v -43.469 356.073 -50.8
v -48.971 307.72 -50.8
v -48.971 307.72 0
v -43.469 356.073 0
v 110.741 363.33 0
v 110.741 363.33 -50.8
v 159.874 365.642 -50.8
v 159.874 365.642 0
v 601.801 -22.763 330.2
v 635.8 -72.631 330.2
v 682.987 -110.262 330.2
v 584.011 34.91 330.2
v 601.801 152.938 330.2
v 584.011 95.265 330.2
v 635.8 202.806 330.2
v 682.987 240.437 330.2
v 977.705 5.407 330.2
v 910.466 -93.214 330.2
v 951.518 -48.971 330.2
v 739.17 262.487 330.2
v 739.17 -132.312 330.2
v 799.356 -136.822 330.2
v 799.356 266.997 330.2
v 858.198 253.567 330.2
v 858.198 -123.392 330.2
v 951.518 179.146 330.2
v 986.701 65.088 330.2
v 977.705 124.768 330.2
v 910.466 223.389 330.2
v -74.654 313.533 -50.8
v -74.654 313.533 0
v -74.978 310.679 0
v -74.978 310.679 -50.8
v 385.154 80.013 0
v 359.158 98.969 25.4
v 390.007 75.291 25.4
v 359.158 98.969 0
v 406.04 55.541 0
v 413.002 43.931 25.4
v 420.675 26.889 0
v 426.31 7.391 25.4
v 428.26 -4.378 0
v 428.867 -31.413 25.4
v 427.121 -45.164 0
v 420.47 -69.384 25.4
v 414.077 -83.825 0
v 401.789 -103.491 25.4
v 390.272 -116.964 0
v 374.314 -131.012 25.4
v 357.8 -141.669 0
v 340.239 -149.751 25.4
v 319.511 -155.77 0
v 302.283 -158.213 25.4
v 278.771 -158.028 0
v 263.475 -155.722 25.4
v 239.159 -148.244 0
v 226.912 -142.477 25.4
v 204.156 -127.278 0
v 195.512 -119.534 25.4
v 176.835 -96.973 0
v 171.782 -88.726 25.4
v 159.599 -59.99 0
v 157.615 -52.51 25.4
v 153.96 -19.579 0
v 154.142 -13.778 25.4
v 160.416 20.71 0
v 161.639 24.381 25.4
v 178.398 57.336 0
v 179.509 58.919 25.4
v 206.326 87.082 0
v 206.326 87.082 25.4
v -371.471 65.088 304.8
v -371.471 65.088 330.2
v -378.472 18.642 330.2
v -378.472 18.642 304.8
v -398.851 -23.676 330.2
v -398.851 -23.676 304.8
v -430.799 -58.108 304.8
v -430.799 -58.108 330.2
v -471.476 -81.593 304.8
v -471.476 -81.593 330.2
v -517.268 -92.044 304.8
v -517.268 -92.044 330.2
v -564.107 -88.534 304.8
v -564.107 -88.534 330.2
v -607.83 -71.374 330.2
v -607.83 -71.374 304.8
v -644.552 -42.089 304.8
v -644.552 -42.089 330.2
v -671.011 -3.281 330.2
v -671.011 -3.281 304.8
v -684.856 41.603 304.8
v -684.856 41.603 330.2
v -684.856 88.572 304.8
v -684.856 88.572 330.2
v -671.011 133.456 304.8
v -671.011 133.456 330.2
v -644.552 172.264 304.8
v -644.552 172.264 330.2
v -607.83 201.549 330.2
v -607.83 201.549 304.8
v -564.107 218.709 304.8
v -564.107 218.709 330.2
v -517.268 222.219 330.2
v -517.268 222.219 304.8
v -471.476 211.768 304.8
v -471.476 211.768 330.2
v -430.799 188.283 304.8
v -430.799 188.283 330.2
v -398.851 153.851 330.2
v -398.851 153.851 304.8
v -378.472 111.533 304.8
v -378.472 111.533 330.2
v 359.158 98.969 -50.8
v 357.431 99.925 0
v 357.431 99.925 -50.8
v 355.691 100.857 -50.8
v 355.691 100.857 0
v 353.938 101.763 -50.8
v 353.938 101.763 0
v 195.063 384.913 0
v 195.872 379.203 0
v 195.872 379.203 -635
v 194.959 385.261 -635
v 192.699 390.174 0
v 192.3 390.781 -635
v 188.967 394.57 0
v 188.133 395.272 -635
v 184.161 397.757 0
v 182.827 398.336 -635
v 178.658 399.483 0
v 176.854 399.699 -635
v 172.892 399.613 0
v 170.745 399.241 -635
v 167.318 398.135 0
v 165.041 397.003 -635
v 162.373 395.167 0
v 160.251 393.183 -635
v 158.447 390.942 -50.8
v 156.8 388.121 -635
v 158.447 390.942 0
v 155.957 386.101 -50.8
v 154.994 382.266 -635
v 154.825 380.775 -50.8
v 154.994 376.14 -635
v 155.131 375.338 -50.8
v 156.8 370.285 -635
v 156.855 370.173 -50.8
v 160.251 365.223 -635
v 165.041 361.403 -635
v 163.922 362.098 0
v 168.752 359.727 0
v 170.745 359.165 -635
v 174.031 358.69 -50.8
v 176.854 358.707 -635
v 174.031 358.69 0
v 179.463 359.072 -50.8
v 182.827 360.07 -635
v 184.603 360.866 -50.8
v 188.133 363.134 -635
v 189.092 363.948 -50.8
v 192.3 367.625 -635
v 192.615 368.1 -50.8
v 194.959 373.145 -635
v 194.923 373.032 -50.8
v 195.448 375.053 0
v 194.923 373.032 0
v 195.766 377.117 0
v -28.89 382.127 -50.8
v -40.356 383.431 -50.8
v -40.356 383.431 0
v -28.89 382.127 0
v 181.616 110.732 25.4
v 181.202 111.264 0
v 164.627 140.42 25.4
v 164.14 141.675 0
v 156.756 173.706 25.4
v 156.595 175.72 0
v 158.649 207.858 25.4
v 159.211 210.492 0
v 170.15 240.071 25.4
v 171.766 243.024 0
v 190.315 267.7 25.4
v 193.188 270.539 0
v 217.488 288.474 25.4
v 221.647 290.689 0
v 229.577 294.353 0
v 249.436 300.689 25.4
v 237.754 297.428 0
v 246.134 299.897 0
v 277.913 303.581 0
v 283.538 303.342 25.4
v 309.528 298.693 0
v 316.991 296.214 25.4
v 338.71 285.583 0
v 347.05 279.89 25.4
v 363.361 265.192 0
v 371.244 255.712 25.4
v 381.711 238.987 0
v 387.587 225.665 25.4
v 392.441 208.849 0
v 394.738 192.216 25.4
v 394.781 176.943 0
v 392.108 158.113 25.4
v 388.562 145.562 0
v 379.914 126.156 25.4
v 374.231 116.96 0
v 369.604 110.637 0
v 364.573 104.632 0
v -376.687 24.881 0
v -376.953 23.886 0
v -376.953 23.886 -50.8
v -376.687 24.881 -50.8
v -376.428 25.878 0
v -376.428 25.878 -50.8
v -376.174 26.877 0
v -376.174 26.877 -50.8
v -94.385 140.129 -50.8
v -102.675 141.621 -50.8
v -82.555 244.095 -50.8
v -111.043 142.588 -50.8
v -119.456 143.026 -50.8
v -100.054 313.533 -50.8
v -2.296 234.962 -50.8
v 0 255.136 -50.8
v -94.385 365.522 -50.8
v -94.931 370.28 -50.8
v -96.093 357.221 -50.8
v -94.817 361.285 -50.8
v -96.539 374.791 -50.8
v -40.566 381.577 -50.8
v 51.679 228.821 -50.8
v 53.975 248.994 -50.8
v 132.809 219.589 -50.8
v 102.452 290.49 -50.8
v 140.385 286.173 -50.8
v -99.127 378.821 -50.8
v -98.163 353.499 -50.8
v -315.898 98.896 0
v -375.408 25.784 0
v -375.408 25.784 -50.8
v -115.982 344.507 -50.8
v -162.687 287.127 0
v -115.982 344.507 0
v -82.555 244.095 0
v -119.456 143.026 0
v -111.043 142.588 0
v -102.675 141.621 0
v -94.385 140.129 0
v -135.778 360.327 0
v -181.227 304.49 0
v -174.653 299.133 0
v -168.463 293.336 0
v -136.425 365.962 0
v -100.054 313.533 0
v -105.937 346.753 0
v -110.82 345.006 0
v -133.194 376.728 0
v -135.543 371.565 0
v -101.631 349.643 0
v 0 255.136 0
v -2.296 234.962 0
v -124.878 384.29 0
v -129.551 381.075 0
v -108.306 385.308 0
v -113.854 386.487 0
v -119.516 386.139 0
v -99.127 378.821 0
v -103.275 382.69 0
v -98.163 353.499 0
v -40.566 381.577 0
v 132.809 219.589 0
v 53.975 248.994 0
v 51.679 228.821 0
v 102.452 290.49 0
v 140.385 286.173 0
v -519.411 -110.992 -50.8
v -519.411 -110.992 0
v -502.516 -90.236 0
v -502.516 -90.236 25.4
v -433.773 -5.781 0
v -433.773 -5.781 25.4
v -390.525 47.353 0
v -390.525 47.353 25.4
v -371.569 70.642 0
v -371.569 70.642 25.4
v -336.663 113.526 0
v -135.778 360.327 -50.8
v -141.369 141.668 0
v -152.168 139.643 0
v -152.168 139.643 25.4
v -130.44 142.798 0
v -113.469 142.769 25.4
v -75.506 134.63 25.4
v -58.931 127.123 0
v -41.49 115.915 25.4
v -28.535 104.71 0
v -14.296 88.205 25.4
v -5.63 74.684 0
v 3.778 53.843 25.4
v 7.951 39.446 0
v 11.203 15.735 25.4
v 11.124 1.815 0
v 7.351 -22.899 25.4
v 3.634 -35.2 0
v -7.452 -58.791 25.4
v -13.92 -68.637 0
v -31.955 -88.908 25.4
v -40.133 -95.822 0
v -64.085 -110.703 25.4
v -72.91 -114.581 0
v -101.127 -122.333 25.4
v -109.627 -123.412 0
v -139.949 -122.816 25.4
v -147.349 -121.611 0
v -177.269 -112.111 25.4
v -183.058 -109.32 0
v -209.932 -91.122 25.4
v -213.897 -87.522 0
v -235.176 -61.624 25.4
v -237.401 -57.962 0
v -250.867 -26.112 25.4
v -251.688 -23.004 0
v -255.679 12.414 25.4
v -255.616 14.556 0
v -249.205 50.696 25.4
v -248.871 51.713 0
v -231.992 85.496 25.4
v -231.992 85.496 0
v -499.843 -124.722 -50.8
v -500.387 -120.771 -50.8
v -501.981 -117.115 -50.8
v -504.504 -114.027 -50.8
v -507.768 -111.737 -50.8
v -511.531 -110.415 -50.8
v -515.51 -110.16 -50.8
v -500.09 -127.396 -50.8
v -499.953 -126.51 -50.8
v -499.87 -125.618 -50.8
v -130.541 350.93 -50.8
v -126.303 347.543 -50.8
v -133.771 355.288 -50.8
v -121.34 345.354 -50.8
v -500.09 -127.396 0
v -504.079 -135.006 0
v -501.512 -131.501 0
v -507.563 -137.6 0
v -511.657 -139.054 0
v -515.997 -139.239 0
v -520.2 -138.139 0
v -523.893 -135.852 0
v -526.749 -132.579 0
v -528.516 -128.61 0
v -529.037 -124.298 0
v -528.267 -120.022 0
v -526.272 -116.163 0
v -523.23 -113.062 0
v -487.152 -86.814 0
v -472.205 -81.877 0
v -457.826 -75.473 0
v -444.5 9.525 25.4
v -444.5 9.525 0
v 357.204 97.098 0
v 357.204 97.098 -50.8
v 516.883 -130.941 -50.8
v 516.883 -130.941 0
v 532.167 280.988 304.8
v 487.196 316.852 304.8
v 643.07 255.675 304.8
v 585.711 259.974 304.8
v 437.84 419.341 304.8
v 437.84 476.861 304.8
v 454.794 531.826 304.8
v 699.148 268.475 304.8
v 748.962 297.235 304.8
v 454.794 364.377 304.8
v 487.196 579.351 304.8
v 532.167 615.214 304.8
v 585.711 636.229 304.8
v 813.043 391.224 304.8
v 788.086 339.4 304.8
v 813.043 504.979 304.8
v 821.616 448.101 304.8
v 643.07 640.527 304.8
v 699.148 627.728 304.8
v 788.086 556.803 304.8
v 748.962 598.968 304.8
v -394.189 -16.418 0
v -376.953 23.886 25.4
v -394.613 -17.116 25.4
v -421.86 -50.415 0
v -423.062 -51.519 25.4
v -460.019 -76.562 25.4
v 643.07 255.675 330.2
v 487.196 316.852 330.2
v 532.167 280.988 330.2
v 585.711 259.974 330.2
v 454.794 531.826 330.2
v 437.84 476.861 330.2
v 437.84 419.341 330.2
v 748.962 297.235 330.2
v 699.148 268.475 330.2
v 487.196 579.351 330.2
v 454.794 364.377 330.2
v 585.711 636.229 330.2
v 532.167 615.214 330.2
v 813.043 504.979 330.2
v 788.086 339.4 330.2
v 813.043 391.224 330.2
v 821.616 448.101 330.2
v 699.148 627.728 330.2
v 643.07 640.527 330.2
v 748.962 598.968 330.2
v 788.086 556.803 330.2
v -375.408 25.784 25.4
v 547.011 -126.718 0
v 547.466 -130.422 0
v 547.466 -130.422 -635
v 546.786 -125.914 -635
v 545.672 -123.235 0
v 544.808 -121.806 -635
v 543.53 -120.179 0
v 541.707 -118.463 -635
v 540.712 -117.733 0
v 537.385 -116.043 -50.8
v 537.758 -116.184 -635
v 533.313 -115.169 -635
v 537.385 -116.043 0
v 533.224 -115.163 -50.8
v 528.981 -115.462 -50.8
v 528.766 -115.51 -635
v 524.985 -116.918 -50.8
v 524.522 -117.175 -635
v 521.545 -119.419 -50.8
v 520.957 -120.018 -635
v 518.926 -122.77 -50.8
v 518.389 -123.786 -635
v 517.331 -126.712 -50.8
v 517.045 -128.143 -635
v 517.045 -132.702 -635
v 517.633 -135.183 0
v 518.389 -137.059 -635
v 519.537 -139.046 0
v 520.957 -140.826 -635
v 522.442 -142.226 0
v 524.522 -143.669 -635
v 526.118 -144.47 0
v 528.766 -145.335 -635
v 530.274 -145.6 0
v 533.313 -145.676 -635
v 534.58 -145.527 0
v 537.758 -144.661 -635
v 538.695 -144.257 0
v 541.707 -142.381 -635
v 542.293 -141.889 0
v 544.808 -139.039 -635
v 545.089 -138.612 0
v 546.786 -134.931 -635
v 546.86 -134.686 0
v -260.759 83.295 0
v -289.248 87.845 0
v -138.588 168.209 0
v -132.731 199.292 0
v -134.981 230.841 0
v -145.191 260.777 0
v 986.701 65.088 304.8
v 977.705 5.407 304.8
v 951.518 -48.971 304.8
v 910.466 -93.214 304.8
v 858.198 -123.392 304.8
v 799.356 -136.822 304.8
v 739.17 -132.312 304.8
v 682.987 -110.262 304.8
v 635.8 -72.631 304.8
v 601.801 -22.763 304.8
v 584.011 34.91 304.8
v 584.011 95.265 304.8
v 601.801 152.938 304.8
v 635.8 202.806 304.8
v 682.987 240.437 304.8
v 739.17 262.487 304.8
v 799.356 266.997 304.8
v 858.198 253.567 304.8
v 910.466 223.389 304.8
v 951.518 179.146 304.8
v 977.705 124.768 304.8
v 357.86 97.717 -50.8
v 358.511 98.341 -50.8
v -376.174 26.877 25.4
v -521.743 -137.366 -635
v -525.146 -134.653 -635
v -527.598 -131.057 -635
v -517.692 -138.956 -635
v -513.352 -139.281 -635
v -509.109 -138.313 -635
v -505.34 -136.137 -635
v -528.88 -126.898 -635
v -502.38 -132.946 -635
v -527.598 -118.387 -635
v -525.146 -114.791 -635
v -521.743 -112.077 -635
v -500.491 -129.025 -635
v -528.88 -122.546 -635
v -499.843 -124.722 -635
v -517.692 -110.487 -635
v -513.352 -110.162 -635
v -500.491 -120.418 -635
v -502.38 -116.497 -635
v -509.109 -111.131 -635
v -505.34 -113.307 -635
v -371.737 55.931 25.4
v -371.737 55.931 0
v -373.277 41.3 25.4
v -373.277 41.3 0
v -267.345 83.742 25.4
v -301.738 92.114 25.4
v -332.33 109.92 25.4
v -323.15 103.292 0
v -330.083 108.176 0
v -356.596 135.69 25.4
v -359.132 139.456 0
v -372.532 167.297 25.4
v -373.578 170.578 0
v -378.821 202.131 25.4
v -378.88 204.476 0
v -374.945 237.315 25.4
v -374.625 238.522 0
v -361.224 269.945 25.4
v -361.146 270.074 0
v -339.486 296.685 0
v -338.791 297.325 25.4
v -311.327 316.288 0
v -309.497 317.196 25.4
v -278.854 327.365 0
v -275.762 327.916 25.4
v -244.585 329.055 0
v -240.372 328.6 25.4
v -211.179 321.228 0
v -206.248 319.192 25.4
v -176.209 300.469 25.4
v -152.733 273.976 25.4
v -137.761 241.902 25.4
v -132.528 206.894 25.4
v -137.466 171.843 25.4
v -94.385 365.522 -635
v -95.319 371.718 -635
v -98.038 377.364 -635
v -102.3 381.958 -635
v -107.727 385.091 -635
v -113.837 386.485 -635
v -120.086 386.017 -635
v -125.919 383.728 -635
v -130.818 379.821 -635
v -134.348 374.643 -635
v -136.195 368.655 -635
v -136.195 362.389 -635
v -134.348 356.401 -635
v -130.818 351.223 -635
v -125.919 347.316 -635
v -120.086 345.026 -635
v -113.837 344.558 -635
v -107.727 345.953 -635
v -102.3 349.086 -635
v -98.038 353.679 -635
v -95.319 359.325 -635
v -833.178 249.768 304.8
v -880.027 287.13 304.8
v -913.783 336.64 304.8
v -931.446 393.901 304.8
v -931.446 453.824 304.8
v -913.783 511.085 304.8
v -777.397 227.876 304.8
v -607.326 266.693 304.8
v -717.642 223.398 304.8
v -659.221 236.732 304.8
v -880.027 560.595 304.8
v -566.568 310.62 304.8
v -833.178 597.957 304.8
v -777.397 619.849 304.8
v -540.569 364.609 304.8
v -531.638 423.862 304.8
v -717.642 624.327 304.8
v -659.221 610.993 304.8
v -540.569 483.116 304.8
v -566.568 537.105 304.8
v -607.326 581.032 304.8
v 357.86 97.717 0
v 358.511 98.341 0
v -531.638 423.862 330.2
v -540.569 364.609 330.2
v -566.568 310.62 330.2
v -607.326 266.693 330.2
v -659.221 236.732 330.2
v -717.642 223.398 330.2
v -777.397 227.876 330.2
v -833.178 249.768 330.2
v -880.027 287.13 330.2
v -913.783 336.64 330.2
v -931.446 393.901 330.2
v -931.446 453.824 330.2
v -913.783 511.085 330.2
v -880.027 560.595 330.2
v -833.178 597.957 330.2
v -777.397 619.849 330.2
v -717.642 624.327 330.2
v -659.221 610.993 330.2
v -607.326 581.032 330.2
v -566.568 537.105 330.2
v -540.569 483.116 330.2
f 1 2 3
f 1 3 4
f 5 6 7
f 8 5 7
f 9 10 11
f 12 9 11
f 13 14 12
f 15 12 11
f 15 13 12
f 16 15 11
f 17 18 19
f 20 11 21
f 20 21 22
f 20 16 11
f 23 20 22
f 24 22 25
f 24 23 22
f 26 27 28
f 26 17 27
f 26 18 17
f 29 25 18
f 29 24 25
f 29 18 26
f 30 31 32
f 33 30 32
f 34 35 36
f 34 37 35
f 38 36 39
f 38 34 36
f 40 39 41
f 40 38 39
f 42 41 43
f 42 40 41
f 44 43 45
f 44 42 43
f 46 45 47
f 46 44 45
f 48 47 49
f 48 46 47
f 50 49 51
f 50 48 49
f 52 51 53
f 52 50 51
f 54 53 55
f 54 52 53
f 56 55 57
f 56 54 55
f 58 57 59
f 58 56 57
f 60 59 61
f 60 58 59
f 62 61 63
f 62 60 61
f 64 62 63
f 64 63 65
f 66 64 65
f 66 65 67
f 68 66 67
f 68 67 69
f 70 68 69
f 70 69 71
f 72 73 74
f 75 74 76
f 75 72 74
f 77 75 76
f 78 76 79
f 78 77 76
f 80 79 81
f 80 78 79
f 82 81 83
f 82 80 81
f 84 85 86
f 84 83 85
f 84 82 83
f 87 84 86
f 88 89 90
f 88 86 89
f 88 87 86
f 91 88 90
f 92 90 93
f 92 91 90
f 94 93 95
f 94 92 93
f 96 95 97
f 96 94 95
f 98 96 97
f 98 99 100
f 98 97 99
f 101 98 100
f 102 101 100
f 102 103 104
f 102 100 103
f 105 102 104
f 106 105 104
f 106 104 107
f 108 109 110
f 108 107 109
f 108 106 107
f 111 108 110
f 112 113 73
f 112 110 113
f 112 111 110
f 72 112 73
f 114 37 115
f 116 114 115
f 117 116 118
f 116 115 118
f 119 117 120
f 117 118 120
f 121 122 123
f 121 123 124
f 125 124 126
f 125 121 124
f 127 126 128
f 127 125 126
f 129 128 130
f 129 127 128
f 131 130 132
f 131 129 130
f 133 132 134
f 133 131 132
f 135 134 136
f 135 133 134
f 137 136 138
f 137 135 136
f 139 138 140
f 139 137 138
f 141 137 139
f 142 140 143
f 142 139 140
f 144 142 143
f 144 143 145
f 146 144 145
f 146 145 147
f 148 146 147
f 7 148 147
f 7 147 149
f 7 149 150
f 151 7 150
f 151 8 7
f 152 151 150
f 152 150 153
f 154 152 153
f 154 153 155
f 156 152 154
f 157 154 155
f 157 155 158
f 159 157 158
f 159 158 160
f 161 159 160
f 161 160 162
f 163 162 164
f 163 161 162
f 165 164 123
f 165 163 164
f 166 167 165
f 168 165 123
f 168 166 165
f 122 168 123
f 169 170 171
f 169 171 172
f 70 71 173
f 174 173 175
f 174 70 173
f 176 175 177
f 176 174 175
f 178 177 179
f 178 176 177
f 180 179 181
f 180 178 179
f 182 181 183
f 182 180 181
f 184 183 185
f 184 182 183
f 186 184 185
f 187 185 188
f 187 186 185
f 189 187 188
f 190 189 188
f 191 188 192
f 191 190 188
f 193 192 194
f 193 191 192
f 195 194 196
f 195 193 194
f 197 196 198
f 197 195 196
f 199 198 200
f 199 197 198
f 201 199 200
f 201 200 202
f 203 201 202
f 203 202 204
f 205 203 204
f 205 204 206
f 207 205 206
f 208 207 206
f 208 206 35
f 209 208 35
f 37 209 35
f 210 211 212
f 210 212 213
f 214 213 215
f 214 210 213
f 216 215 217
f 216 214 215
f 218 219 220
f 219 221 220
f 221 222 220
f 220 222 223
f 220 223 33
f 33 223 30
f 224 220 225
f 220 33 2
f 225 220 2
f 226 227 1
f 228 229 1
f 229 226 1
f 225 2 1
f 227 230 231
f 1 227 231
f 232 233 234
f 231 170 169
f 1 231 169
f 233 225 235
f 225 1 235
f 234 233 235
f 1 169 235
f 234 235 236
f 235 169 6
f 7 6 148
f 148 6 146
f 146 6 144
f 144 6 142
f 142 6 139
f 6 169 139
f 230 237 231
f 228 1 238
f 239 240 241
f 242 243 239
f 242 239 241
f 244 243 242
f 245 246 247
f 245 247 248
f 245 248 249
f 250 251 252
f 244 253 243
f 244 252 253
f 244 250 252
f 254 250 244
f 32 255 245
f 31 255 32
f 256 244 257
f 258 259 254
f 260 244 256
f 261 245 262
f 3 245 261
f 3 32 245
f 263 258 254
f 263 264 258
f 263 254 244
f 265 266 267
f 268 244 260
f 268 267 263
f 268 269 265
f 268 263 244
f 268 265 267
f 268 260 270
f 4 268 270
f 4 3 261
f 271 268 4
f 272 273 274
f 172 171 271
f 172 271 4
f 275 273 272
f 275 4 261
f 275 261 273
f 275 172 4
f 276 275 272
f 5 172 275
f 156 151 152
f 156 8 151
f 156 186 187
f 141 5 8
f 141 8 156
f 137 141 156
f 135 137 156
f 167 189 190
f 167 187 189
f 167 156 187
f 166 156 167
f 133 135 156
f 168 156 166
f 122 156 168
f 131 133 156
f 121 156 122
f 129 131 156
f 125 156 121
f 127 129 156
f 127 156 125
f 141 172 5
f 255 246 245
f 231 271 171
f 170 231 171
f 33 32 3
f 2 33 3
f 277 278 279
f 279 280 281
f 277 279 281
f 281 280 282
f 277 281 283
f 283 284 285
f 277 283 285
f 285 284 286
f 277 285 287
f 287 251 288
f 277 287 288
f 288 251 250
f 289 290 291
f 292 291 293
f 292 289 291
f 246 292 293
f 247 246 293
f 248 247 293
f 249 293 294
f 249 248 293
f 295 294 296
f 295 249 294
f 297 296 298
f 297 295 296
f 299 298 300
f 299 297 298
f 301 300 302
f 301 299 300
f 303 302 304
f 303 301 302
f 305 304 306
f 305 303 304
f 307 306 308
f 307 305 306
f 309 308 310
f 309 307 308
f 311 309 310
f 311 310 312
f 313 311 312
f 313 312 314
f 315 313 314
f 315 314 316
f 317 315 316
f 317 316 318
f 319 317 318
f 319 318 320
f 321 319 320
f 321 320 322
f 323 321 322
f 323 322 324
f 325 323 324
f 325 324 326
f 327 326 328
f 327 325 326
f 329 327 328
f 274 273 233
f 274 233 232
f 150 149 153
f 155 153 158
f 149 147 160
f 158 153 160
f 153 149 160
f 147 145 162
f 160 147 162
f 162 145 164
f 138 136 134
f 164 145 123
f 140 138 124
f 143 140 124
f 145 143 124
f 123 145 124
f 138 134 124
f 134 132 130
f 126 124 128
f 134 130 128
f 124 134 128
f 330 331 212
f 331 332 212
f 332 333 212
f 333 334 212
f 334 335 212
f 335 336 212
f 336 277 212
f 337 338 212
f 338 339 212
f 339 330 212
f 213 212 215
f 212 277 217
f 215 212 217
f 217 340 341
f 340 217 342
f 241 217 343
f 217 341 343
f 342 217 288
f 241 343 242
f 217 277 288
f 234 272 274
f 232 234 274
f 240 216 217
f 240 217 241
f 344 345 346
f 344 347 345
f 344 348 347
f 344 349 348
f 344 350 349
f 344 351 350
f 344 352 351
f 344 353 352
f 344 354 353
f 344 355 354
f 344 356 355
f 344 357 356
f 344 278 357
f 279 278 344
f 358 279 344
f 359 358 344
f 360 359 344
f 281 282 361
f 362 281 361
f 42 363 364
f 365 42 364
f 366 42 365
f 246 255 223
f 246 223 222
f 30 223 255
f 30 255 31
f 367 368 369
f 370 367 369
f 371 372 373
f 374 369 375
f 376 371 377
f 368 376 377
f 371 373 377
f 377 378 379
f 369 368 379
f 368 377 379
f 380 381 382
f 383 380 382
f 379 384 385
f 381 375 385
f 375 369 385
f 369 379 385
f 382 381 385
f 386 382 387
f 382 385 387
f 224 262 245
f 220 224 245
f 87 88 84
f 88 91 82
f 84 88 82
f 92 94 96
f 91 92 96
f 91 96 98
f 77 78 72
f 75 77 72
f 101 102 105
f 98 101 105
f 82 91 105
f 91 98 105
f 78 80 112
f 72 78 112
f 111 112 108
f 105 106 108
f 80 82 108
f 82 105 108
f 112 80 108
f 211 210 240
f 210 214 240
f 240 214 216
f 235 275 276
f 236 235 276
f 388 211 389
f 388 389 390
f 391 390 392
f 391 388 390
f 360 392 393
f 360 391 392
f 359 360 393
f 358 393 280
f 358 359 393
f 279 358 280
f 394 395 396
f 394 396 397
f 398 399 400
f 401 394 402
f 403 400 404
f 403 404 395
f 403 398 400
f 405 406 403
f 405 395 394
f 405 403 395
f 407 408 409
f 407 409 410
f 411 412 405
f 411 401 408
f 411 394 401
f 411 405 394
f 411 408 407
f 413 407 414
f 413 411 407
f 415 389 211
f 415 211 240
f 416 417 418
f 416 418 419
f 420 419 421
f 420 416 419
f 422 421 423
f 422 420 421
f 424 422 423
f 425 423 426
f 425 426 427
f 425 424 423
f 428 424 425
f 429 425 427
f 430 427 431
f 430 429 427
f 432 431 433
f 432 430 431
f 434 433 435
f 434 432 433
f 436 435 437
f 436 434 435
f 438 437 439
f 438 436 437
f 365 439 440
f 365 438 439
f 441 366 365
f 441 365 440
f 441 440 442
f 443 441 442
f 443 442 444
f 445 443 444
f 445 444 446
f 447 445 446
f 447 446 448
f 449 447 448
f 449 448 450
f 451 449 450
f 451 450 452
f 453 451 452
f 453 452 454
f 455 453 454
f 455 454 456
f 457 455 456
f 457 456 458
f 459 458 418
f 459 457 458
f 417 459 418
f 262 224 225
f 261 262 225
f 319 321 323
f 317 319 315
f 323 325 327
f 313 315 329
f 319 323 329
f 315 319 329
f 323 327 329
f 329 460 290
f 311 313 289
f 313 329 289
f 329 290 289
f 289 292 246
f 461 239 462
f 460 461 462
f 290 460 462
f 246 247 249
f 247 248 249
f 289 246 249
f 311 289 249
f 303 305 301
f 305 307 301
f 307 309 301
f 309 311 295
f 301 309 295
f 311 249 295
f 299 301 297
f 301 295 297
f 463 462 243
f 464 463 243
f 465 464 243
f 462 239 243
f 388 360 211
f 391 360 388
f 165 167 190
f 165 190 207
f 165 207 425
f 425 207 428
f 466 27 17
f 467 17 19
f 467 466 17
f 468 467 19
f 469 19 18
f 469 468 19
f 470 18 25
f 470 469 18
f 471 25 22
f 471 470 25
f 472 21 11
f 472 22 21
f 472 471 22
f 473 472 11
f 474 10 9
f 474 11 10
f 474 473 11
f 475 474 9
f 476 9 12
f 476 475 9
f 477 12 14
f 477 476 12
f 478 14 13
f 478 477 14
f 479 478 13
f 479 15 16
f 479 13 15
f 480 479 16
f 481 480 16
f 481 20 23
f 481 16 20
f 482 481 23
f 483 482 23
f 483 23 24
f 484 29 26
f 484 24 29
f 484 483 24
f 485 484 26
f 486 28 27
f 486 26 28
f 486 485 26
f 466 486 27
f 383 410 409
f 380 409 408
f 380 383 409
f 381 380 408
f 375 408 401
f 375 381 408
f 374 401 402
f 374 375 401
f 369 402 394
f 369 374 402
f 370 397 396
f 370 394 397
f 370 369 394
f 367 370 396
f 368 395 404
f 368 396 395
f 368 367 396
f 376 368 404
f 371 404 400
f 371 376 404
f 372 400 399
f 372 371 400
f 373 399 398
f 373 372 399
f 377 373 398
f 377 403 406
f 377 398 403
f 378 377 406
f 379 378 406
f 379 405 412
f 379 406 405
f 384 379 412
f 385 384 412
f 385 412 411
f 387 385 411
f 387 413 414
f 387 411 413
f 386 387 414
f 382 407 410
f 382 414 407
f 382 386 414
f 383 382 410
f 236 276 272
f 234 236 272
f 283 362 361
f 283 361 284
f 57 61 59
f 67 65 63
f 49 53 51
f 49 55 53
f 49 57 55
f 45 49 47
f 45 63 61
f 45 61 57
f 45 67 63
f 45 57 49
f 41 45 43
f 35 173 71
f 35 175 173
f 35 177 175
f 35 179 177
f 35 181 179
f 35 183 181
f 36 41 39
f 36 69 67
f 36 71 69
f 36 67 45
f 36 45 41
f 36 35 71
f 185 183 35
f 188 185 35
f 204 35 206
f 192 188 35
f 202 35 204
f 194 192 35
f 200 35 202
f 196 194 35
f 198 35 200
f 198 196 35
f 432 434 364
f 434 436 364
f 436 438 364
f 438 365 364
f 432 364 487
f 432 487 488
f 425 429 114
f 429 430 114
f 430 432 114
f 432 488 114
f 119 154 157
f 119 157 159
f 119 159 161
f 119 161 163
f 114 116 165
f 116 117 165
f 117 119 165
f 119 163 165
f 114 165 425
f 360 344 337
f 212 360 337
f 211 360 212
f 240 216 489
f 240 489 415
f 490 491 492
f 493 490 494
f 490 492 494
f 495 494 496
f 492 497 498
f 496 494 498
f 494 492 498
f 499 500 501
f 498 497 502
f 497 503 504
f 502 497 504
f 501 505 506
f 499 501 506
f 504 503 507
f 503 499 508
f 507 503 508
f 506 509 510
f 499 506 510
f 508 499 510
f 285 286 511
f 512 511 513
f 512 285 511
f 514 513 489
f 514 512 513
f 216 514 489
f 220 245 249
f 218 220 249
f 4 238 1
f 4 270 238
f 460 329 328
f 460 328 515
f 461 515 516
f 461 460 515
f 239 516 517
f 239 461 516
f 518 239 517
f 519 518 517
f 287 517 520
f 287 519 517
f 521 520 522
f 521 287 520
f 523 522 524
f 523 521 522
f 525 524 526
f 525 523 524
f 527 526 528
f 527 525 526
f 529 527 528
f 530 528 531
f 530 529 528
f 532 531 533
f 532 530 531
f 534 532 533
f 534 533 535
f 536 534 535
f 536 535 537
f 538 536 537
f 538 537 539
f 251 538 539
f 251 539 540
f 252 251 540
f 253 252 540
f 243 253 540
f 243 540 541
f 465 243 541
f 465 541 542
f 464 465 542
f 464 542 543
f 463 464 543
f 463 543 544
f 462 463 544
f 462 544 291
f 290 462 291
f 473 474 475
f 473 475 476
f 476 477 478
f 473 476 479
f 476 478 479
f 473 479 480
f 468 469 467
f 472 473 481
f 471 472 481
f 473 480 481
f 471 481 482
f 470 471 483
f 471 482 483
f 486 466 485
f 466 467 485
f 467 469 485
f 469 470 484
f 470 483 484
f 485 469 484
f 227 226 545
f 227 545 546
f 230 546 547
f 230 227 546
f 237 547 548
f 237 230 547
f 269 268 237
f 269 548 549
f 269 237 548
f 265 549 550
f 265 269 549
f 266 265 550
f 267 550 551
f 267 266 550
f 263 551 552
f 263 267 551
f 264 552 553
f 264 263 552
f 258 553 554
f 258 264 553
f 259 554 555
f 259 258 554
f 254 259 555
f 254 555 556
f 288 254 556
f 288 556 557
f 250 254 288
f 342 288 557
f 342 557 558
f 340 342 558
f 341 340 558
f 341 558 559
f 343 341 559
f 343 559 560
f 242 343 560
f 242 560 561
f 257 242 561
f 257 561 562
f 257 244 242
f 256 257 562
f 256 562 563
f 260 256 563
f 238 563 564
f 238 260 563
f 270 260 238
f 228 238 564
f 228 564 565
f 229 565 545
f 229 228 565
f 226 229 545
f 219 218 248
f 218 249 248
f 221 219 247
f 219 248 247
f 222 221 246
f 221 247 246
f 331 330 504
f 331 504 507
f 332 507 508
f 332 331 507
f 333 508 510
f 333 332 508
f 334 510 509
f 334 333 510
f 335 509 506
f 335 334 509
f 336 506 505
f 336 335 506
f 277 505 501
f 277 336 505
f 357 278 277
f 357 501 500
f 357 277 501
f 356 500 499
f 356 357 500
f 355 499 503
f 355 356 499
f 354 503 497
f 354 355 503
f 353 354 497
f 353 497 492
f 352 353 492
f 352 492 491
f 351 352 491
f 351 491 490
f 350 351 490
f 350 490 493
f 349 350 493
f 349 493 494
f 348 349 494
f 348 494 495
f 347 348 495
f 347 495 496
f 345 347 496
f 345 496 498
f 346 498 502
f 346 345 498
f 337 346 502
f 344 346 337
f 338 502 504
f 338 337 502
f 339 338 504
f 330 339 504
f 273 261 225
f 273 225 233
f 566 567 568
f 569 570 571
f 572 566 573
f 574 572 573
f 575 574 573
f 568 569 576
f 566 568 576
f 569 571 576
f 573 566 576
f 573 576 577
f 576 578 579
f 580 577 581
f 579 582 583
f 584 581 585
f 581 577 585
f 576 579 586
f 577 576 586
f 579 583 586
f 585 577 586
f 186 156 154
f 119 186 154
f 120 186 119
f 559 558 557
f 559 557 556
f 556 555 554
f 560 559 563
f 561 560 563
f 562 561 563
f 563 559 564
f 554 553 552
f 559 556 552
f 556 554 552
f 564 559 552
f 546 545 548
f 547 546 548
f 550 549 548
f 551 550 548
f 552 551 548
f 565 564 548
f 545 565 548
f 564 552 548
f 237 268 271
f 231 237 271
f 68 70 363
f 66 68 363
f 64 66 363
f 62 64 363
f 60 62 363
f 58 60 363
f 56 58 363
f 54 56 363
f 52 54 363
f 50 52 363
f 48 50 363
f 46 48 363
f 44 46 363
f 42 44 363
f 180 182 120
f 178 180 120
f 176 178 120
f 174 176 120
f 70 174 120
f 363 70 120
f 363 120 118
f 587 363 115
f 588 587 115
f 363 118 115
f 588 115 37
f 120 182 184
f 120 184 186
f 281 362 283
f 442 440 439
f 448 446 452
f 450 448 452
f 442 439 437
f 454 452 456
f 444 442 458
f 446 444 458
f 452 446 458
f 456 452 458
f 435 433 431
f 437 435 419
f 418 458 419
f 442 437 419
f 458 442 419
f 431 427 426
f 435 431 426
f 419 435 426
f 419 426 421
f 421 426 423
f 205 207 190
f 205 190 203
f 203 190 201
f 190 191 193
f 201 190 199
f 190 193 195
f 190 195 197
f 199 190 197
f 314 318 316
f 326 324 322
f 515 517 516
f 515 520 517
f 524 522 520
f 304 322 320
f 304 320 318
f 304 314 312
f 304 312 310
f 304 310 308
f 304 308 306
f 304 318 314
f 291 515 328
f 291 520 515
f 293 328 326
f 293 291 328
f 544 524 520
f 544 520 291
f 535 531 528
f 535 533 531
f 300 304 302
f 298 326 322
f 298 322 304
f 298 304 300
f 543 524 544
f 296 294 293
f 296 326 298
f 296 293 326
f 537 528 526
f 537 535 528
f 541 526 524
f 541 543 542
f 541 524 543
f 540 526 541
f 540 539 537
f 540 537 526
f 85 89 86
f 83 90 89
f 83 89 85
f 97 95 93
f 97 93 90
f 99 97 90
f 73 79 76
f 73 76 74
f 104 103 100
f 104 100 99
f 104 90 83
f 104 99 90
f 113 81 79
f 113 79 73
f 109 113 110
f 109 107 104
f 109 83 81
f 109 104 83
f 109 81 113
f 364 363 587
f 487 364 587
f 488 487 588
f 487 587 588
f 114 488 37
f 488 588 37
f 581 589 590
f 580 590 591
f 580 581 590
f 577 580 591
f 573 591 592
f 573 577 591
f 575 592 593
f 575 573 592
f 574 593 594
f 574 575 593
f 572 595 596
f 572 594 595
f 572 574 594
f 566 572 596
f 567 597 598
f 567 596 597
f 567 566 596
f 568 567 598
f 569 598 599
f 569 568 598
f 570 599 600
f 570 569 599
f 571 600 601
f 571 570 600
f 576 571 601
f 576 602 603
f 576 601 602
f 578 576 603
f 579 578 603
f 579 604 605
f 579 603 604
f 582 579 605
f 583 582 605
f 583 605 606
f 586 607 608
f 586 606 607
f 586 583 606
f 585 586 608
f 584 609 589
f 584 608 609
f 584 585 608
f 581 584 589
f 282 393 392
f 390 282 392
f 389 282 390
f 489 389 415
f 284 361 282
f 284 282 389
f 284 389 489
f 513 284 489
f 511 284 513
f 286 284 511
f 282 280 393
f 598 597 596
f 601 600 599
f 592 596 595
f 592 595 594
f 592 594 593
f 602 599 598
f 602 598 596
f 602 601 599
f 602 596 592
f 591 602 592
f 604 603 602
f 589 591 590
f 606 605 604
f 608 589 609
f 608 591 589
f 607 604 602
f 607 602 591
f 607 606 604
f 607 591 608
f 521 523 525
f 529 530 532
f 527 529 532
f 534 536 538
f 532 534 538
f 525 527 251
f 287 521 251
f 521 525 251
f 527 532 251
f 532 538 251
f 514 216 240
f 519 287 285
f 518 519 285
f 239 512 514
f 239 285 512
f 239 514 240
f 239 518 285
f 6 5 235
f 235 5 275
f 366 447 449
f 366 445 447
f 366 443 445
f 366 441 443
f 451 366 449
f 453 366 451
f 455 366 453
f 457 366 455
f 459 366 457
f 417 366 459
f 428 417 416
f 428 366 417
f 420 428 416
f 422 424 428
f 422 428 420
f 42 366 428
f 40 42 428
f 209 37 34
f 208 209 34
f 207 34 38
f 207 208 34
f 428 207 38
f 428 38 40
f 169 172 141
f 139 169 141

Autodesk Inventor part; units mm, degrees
ref_plane "YZ Plane" through (0, 0, 0) normal (1, 0, 0) x (0, 1, 0)
ref_plane "XZ Plane" through (0, 0, 0) normal (0, 1, 0) x (-1, 0, 0)
sketch "Sketch1" plane through (0, 0, 0) normal (0, 0, 1) x (1, 0, 0)
  line L0 (-40.3555, 383.4313) -> (111.0673, 366.2011)
  line L1 (111.0673, 366.2011) -> (102.4522, 290.4897)
  line L2 (102.4522, 290.4897) -> (-48.9706, 307.7199)
  line L3 (-48.9706, 307.7199) -> (-40.3555, 383.4313)
  line L4 (-87.7484, 312.1324) -> (140.3854, 286.1733)
  line L5 (140.3854, 286.1733) -> (132.8088, 219.5891)
  line L6 (132.8088, 219.5891) -> (-95.3249, 245.5482)
  line L7 (-95.3249, 245.5482) -> (-87.7484, 312.1324)
  circle A0 centre (175.3182, 379.203) radius 20.5535
  circle A1 centre (-115.4076, 365.5218) radius 21.0224
  circle A2 centre (532.1699, -130.4223) radius 15.2961
  circle A3 centre (-514.4431, -124.7218) radius 14.6004
  line L8 (-128.6785, 349.2176) -> (-505.2263, -113.3983) construction
  line L9 (-94.4085, 366.51) -> (154.7875, 378.2368) construction
  line L10 (187.1074, 362.3667) -> (523.3963, -117.8926) construction
  line L11 (-87.7484, 312.1324) -> (-107.085, 142.1977)
  circle A4 centre (-732.6645, 423.8625) radius 24.2389
  circle A5 centre (-732.6645, 423.8625) radius 201.0267
  circle A6 centre (628.65, 448.1014) radius 192.9655
  circle A7 centre (784.225, 65.0875) radius 202.4756
  circle A8 centre (-122.1817, 9.525) radius 133.5288
  circle A9 centre (-529.0436, 65.0875) radius 157.5724
  circle A10 centre (-255.7105, 206.375) radius 123.1837
  circle A11 centre (275.6471, 184.2457) radius 119.3572
  circle A12 centre (291.6085, -20.9726) radius 137.6551
  line L12 (-519.4107, -110.9924) -> (-135.7782, 360.3274)
  line L13 (-99.1269, 378.8214) -> (158.4473, 390.9425)
  line L14 (194.9233, 373.0316) -> (537.3847, -116.0426)
  line L15 (-500.0898, -127.3963) -> (-115.9822, 344.5072)
  line L16 (-98.1626, 353.4988) -> (159.8736, 365.6417)
  line L17 (174.0312, 358.6899) -> (516.8827, -130.9415)
  line L18 (-74.6538, 313.5326) -> (-94.3852, 140.1286)
  line L19 (-100.0538, 313.5326) -> (-119.4555, 143.026)
  line L20 (-100.0538, 313.5326) -> (-74.6538, 313.5326)
  line L21 (0, 255.1359) -> (53.975, 248.9942)
  line L22 (53.975, 248.9942) -> (36.2304, 93.0509)
  line L23 (36.2304, 93.0509) -> (-17.7446, 99.1926)
  line L24 (-17.7446, 99.1926) -> (0, 255.1359)
  line L25 (-444.5, 9.525) -> (-390.525, 47.3529)
  line L26 (-390.525, 47.3529) -> (-276.9226, -114.7417)
  line L27 (-276.9226, -114.7417) -> (-330.8976, -152.5695)
  line L28 (-330.8976, -152.5695) -> (-444.5, 9.525)
  point P0 (0, 0)
  point P1 (353.9374, 101.7631)
  point P2 (359.158, 98.9691)
  point P3 (357.2038, 97.0983)
  point P4 (-43.4686, 356.0727)
  point P5 (-74.9784, 310.6793)
  point P6 (-82.555, 244.0951)
  point P7 (-2.2955, 234.9625)
  point P8 (51.6795, 228.8208)
  point P9 (110.7406, 363.3296)
  point P10 (-28.89, 382.1267)
  point P11 (-40.5665, 381.5772)
  point P12 (-376.9531, 23.8858)
  point P13 (-376.1743, 26.8765)
  point P14 (-375.4084, 25.7836)
  point P15 (206.3261, 87.0822)
  point P16 (-231.992, 85.4963)
  point P17 (-152.1677, 139.6434)
  point P18 (-433.7732, -5.7806)
  point P19 (-502.5158, -90.2359)
  point P20 (-371.569, 70.6416)
  dimension "d0" = 152.4
  dimension "d1" = 76.2
  dimension "d2" = 12.5196
  dimension "d3" = 12.8203
  dimension "d4" = 12.8523
  dimension "d5" = 12.3848
extrude "Extrusion1" add sketch "Sketch1" against normal blind 635 contours A0 | A1 | A2 | A3
extrude "Extrusion2" add sketch "Sketch1" against normal blind 50.8 contours L0 L13 L3 | L13 A0 L16 L1 L0 | L0 L1 L16 L3 L13 | L3 L16 A1 L13 | L16 L1 L2 L3 | L2 L4 L5 L6 L22 L21 L24 L18 | A1 L15 A10 L12 | L14 A11 L17 A0 | L18 L6 L7 L4 | L4 L7 L11 A8 L19 L20 L18 | A10 L15 L12 | L14 A11 A12 L17 | L18 A8 L11 L6 | A10 L15 L26 A9 L12 | L14 A2 L17 A12 A11 | A9 L26 L12 | A12 L17 A11 | L12 L28 L15 A9 | A9 L15 A3 L12 | L26 A9 L15 L28 L12 picked at (403.6158, 34.733)
extrude "Extrusion3" add sketch "Sketch1" along normal blind 25.4 contours L12 A10 | A10 L15 L12 | L14 A11 A12 L17 | A11 L14 | L17 A12 A11 | A10 A8 L15 | A12 L17 A11 | A11 L17 A12 | A12 A11 L17 | A8 A10 | A9 L26 L12 | A12 L17 A11 | A10 A8 | L15 A9 L26 | L12 L28 L15 A9 | L26 A9 L15 L28 L12 | L12 L28 L25 | A9 L28 L15 | L15 L28 A9
ref_plane "Work Plane1" through (0, 0, 304.8) normal (0, 0, 1) x (1, 0, 0)
sketch "Sketch2" plane through (0, 0, 304.8) normal (0, 0, 1) x (1, 0, 0)
  circle A0 centre (-732.6645, 423.8625) radius 201.0267 projected
  circle A1 centre (628.65, 448.1014) radius 192.9655 projected
  circle A2 centre (784.225, 65.0875) radius 202.4756 projected
  circle A3 centre (-529.0436, 65.0875) radius 157.5724 projected
  point P0 (0, 0)
extrude "Extrusion4" add sketch "Sketch2" along normal blind 25.4
properties part number "Drums"
